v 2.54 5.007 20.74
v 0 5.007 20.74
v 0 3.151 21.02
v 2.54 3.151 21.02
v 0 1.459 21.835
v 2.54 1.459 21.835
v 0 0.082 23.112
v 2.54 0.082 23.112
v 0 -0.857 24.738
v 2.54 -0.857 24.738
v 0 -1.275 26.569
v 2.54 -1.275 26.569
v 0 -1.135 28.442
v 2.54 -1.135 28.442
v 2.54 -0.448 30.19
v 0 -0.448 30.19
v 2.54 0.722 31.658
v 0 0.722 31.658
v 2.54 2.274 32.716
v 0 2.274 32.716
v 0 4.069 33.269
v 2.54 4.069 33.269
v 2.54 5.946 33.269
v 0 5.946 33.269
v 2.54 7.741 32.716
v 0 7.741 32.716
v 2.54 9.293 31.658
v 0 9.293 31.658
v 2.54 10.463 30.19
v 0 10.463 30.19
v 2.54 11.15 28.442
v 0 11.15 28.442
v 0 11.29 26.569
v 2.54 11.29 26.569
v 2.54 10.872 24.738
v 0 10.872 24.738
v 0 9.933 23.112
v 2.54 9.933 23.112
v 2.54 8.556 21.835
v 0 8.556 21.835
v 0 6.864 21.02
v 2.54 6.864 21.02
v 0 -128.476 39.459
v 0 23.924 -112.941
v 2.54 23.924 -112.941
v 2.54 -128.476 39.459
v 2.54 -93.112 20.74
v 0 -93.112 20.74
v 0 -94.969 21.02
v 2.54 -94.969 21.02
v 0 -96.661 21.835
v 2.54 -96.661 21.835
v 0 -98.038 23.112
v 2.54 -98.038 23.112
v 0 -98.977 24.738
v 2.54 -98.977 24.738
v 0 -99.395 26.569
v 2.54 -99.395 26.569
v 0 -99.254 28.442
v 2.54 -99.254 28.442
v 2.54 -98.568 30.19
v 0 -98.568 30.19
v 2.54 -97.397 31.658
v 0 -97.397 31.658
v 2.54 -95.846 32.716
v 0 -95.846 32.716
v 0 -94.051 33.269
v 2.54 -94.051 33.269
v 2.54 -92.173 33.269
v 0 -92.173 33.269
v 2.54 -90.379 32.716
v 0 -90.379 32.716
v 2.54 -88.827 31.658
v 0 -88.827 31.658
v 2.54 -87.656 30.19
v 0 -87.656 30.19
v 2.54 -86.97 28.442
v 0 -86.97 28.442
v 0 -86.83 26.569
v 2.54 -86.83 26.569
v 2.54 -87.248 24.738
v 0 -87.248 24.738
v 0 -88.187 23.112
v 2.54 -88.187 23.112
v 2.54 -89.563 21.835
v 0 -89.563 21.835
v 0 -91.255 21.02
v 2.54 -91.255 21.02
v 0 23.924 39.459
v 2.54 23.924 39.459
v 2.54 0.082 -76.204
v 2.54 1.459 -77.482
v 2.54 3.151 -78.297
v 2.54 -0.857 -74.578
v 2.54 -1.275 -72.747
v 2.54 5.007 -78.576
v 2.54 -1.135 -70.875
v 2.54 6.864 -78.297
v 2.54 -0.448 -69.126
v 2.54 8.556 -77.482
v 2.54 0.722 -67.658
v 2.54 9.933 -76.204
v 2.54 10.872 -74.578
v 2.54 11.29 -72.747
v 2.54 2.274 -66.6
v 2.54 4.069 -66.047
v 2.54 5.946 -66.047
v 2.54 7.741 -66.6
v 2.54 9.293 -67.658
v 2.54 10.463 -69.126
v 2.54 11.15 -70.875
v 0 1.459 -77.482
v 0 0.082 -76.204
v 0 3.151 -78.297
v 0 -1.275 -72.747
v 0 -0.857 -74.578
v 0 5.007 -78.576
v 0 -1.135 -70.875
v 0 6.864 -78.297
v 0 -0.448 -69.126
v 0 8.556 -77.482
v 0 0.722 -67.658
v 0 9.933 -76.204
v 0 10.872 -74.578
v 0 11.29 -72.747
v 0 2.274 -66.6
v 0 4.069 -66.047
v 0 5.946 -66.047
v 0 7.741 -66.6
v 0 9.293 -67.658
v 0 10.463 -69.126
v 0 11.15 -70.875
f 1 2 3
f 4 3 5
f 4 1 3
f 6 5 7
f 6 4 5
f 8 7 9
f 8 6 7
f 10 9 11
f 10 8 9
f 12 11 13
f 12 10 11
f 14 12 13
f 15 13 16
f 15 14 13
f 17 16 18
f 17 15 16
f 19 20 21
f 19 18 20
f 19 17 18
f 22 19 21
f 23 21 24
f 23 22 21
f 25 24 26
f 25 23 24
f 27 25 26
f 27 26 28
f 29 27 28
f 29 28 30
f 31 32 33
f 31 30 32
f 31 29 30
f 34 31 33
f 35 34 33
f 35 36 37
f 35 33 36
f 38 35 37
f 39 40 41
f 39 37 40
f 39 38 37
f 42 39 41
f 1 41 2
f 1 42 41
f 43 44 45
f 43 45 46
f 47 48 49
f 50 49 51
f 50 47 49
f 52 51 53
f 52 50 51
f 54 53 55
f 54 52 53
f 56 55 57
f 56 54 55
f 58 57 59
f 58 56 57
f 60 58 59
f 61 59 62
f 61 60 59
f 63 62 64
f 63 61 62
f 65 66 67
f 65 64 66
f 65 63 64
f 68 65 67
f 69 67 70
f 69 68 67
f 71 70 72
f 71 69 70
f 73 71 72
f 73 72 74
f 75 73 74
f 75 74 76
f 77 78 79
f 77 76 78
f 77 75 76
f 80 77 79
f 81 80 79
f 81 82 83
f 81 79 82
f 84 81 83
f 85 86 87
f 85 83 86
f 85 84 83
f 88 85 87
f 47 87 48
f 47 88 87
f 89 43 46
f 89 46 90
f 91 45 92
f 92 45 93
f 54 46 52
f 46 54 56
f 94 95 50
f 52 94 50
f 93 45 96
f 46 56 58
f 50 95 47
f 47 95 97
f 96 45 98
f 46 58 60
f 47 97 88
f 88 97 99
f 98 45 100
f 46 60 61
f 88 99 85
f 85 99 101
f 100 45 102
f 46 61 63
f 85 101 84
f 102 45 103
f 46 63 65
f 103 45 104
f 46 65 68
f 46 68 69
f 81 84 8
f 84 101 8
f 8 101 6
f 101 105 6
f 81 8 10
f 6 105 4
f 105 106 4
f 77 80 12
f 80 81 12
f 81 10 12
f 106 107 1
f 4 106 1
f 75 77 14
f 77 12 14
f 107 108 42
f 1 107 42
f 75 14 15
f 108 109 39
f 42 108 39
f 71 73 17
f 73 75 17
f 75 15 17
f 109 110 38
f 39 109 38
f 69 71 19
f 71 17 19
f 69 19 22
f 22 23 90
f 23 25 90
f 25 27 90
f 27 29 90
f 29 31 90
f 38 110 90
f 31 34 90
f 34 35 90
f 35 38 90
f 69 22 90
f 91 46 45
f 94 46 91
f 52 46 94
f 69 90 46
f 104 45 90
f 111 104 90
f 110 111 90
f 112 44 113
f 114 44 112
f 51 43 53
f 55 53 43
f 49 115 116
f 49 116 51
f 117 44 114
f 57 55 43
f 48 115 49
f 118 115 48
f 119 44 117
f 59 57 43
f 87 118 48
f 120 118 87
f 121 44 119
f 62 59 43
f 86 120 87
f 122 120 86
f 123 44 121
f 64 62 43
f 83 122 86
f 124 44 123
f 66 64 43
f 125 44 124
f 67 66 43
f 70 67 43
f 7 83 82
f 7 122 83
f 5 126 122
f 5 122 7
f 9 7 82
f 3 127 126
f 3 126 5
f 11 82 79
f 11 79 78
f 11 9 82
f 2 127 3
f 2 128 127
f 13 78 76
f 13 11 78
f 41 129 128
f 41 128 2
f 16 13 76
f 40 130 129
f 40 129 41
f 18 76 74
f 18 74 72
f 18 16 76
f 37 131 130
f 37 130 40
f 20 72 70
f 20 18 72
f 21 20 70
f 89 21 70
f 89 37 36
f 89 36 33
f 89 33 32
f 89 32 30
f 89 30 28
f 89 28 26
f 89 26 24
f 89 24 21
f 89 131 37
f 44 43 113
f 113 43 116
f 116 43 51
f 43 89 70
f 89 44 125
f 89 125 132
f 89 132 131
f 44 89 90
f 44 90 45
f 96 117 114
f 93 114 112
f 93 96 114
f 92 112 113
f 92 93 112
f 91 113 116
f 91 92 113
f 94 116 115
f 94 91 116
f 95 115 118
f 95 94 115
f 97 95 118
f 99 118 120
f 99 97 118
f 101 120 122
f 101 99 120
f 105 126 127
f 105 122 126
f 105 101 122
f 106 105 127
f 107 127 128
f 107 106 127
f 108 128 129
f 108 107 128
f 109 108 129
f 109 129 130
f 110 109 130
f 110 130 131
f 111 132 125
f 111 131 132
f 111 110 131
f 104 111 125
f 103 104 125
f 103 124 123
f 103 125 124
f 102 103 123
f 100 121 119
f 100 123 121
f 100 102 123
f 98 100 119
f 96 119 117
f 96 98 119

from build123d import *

# Parameters (mm, degrees)
BOSS_EXTRUDE1_DEPTH                            = 2.54
CSK_FOR_M6_FLAT_HEAD_MACHINE_SCREW1_AT_2_COUNT = 2
CSK_FOR_M6_FLAT_HEAD_MACHINE_SCREW1_AT_2_PITCH = 99.31634163
CSK_FOR_M6_FLAT_HEAD_MACHINE_SCREW1_AT_3_COUNT = 2
CSK_FOR_M6_FLAT_HEAD_MACHINE_SCREW1_AT_3_PITCH = 98.119759201


with BuildPart() as part:
    # Sketch1 → Boss-Extrude1 (new body)
    with BuildSketch(Plane(origin=(0, 0, 0), x_dir=(0, 0, -1), z_dir=(1, 0, 0))):
        Polygon((112.940672783, 23.924159021), (-39.459327217, -128.475840979), (-39.459327217, 23.924159021), align=None)
    extrude(amount=BOSS_EXTRUDE1_DEPTH)

    # Sketch3 → CSK for M6 Flat Head Machine Screw1 (revolve, cut)
    with BuildSketch(Plane(origin=(2.54, 5.007497158, 27.039858725), x_dir=(0, 0, -1), z_dir=(0, 1, 0))):
        Polygon((0, 0), (0, 2.54), (3.3, 2.54), (3.3, 28.4), (6.3, 25.4), (6.3, 0), align=None)
    csk_for_m6_flat_head_machine_screw1 = revolve(axis=Axis((8.89, 5.007497158, 27.039858725), (-1, 0, 0)), mode=Mode.SUBTRACT)

    # CSK for M6 Flat Head Machine Screw1 at 2: CSK for M6 Flat Head Machine Screw1 ×2
    with Locations(*[(0, 0, -i * CSK_FOR_M6_FLAT_HEAD_MACHINE_SCREW1_AT_2_PITCH) for i in range(1, CSK_FOR_M6_FLAT_HEAD_MACHINE_SCREW1_AT_2_COUNT)]):
        add(csk_for_m6_flat_head_machine_screw1, mode=Mode.SUBTRACT)

    # CSK for M6 Flat Head Machine Screw1 at 3: CSK for M6 Flat Head Machine Screw1 ×2
    with Locations(*[(0, -i * CSK_FOR_M6_FLAT_HEAD_MACHINE_SCREW1_AT_3_PITCH, 0) for i in range(1, CSK_FOR_M6_FLAT_HEAD_MACHINE_SCREW1_AT_3_COUNT)]):
        add(csk_for_m6_flat_head_machine_screw1, mode=Mode.SUBTRACT)


solid = part.part
